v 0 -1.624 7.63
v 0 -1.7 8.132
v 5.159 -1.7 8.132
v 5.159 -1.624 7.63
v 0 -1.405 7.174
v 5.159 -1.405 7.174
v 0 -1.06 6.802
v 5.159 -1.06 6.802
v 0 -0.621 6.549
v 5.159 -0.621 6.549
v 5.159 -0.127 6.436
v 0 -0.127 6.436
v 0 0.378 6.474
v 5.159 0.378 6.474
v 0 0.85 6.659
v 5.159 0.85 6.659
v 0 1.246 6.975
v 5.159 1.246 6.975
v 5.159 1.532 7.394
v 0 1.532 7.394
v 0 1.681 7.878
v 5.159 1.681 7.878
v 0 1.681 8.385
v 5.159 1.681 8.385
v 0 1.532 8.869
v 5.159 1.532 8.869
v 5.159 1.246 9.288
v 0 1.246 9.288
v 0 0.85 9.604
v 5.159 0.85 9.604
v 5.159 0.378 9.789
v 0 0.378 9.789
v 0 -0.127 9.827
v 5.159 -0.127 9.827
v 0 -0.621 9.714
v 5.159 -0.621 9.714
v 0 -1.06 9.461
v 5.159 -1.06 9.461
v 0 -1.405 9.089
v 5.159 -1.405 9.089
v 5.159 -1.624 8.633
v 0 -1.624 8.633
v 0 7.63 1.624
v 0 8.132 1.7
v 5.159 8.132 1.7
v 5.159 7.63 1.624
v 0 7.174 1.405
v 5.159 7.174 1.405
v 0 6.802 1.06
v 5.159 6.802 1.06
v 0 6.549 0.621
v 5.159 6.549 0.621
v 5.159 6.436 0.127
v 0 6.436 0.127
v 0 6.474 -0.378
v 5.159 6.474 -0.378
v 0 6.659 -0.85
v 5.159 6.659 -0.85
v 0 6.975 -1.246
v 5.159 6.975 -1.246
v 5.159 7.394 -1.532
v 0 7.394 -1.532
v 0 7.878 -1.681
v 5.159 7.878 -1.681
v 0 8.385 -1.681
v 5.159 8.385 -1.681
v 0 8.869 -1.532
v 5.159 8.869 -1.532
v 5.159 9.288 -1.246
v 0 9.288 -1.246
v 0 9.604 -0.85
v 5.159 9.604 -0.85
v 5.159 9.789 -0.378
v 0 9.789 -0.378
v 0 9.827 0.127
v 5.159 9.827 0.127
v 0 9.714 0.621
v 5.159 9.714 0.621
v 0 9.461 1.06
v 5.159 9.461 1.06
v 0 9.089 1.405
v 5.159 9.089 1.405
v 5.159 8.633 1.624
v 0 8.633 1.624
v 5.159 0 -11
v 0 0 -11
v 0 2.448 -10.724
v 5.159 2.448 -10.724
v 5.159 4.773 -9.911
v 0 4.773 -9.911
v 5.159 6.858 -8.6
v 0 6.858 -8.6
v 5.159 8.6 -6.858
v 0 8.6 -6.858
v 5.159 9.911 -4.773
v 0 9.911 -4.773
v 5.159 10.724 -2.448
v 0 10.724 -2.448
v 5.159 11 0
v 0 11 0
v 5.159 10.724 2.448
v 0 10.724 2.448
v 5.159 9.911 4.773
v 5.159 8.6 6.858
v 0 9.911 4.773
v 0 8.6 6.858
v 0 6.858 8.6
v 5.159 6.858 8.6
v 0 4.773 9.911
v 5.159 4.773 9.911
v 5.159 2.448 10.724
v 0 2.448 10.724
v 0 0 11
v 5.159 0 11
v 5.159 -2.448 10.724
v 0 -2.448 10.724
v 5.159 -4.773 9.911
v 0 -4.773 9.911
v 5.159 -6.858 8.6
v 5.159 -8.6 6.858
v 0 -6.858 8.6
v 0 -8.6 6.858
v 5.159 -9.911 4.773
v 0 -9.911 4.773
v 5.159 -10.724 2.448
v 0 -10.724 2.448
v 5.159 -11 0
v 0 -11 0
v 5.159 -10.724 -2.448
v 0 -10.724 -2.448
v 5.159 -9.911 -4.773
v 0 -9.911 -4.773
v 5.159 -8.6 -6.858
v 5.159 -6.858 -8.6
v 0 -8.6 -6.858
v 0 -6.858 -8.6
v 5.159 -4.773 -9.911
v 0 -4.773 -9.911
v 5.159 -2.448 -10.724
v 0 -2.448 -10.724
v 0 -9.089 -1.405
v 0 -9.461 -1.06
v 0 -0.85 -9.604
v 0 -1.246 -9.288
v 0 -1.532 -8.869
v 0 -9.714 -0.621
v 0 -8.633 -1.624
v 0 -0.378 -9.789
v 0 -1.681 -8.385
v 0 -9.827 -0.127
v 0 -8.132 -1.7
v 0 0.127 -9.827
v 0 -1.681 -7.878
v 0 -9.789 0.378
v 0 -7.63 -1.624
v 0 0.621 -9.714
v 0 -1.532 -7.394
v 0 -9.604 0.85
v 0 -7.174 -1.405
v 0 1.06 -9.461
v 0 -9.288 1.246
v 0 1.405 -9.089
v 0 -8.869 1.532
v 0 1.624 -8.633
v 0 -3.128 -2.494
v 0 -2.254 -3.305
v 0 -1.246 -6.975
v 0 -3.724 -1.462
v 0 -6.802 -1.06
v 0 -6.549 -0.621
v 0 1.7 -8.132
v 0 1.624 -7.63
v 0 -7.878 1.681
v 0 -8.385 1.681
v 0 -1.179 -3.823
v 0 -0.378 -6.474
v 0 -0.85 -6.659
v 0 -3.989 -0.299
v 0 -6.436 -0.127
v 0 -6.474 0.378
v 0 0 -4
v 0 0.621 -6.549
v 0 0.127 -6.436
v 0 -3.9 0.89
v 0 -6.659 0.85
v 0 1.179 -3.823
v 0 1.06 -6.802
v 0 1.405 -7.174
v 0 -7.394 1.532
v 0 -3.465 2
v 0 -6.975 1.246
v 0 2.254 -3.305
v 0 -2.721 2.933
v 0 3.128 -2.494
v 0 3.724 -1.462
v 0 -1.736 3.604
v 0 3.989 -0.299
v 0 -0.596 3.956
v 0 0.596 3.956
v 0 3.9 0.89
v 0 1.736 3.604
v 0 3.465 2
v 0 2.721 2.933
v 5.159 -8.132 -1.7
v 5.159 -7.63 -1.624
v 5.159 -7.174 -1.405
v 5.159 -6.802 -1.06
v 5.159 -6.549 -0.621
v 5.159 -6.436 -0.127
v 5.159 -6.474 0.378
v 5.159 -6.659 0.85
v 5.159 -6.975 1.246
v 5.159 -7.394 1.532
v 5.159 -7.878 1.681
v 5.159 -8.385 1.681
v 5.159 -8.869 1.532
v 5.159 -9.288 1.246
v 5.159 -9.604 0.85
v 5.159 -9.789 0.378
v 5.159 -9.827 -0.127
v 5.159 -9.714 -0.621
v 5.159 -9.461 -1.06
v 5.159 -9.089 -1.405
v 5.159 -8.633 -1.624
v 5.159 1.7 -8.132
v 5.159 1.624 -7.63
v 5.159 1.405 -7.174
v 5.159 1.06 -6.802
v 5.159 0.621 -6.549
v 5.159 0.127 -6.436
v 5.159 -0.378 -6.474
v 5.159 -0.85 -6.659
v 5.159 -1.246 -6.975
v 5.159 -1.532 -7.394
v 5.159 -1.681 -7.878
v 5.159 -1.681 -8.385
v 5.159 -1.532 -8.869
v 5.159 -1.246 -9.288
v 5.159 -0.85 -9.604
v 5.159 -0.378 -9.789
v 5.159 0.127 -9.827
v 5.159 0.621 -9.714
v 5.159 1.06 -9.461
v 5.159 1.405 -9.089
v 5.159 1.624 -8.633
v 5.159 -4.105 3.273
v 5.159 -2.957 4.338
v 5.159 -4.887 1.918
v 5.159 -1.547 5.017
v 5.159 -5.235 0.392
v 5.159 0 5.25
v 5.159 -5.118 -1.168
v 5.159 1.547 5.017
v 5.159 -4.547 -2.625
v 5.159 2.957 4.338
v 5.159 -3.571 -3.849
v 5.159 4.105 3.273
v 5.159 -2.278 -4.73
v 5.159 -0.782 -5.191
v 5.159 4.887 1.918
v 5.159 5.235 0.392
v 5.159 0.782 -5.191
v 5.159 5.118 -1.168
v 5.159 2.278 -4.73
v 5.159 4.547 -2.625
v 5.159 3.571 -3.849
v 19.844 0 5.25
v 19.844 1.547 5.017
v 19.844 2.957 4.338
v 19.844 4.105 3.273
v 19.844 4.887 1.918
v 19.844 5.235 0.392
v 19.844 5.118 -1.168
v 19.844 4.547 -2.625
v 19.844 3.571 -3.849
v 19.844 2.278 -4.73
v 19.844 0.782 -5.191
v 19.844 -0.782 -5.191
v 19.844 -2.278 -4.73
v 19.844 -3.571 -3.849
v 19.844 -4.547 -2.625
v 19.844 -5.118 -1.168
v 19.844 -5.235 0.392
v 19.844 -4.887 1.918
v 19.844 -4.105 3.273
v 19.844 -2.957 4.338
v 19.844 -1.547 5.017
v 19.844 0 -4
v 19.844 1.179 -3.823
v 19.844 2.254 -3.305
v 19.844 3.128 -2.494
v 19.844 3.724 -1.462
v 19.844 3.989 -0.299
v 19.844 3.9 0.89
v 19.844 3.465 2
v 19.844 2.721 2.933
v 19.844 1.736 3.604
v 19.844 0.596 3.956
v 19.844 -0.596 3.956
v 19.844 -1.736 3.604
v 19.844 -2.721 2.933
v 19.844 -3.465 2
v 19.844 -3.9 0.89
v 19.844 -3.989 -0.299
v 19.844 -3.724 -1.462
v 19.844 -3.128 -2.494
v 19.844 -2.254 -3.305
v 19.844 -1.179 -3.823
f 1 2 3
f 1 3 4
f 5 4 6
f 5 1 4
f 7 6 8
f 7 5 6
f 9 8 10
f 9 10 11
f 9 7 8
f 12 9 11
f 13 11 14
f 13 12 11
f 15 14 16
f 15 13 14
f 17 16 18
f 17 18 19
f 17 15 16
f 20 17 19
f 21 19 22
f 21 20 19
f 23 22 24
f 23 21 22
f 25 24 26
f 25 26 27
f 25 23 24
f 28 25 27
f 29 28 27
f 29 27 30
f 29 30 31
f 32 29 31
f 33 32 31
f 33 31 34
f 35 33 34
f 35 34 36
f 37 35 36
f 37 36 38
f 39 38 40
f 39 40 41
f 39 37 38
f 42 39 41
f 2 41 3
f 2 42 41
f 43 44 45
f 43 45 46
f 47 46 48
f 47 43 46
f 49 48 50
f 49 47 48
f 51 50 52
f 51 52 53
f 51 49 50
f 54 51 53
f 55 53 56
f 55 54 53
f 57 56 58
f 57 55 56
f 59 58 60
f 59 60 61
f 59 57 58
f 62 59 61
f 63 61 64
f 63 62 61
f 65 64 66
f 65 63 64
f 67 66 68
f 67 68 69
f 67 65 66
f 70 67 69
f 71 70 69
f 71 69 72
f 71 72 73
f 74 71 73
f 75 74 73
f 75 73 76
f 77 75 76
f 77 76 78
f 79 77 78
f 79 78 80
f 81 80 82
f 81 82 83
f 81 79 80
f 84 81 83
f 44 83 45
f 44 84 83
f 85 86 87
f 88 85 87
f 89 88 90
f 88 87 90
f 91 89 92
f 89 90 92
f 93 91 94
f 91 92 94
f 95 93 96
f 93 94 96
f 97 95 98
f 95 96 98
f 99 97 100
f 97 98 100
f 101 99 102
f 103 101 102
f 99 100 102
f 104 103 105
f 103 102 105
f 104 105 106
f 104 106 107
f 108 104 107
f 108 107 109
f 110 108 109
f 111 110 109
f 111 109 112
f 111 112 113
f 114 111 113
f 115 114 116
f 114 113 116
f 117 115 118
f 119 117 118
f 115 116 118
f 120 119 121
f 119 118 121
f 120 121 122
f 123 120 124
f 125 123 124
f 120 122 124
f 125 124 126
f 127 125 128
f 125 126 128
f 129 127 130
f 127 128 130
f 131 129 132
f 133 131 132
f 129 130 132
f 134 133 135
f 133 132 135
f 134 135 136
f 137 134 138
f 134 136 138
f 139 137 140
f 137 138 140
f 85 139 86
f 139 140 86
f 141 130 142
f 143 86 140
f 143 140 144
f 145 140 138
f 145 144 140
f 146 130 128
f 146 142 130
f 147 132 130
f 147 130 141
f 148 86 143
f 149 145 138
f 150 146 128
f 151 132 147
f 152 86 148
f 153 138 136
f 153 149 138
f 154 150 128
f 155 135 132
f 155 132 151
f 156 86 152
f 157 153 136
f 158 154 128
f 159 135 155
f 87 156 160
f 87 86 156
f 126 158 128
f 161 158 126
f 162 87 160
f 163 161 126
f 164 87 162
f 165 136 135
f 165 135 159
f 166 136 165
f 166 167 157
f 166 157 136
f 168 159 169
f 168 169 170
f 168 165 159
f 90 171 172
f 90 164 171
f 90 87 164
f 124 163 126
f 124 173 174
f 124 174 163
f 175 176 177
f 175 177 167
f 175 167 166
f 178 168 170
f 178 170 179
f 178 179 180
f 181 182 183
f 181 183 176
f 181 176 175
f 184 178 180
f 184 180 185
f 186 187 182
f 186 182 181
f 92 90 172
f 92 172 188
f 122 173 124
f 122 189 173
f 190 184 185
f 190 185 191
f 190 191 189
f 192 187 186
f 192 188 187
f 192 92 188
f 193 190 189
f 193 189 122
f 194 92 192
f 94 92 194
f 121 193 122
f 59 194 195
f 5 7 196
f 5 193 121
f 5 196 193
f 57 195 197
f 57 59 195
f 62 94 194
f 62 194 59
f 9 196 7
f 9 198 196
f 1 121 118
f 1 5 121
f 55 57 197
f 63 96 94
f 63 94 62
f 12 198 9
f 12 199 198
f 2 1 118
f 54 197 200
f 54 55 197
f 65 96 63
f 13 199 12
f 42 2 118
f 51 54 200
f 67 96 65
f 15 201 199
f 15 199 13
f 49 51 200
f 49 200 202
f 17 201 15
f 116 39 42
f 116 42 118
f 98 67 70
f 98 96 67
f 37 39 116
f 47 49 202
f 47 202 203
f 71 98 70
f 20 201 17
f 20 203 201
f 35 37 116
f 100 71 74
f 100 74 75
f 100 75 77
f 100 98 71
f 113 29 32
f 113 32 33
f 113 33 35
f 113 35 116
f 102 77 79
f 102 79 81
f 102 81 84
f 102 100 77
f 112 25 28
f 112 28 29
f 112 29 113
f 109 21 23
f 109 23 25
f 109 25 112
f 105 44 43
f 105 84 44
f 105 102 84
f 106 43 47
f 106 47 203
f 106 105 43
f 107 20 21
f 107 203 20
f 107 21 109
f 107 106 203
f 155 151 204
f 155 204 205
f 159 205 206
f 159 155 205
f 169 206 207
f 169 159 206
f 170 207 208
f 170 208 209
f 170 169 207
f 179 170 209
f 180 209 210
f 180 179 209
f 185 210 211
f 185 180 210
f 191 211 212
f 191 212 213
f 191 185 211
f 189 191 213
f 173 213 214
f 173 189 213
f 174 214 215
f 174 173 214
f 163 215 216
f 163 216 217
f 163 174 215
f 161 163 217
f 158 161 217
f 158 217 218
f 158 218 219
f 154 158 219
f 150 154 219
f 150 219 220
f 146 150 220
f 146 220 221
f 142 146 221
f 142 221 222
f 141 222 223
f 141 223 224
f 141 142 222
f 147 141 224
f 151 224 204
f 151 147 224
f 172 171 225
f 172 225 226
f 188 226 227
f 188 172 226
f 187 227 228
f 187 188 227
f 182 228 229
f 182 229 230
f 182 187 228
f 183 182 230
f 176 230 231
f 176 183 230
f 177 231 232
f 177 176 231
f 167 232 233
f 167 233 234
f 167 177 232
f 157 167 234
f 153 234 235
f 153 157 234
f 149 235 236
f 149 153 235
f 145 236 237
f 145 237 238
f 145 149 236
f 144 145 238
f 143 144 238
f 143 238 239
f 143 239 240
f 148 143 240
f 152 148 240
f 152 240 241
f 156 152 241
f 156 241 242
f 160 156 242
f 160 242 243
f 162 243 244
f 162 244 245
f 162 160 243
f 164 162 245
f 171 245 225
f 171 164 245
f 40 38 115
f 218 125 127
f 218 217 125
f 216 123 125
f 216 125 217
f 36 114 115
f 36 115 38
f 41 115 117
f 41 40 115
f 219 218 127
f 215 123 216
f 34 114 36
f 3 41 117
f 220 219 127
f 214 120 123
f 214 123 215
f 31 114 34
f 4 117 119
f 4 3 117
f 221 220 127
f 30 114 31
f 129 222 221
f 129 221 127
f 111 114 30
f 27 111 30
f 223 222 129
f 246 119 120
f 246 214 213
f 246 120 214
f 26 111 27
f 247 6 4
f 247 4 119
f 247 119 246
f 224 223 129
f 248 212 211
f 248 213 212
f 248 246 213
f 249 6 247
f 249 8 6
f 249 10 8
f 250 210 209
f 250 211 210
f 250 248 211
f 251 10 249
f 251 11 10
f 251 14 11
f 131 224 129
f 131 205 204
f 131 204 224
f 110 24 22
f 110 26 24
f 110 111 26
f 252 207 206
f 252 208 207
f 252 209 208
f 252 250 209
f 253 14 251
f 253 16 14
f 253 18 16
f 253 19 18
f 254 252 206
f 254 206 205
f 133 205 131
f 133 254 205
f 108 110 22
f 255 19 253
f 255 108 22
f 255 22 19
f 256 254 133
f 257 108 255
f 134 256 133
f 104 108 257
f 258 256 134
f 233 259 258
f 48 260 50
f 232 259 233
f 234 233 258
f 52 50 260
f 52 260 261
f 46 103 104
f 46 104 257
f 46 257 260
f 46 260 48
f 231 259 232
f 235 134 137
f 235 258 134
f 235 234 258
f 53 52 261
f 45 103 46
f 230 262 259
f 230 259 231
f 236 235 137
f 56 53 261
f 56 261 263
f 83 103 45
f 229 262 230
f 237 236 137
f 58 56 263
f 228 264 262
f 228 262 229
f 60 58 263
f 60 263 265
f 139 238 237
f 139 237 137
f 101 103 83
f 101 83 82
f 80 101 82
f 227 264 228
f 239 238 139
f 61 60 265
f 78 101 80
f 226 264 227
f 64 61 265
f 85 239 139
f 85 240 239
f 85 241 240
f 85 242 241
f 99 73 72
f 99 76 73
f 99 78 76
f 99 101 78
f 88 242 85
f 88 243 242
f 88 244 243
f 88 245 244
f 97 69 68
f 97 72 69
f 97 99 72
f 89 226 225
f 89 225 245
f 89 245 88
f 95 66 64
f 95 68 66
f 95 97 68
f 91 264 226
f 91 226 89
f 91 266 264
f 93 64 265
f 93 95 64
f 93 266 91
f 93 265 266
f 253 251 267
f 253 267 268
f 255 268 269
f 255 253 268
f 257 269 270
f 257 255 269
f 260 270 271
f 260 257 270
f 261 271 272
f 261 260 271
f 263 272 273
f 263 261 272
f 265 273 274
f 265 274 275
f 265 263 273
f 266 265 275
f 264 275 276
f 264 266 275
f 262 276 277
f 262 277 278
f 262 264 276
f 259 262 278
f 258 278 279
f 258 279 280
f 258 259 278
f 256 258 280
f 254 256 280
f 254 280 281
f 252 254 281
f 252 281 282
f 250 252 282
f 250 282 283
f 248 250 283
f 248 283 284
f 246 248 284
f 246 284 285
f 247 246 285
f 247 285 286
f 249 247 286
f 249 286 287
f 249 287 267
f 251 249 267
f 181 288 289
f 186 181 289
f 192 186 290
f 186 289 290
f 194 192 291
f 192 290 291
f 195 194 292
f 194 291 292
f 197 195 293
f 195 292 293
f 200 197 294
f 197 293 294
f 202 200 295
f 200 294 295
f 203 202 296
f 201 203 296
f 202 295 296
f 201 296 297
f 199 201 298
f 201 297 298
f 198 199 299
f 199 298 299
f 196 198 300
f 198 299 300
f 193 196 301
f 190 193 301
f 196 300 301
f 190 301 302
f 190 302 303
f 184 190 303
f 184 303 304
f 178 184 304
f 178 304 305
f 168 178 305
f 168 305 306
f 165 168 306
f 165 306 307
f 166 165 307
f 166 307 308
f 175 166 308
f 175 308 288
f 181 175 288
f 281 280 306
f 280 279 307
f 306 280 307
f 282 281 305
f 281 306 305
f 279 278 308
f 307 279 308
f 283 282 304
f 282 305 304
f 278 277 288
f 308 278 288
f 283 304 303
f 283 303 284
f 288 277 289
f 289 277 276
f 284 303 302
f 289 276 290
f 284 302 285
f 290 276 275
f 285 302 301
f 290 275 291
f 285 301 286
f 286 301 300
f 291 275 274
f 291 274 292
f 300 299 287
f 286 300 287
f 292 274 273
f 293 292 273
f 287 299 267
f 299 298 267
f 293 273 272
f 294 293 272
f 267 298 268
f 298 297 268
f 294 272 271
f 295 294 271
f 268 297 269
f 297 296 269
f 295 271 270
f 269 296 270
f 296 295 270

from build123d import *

# Parameters (mm, degrees)
SKETCH4_R           = 11
BOSS_EXTRUDE2_DEPTH = 5.159375
SKETCH5_R           = 5.25
BOSS_EXTRUDE3_DEPTH = 19.84375
SKETCH6_R           = 1.7
CUT_EXTRUDE1_DEPTH  = 5.159375
CIRPATTERN2_COUNT   = 4
SKETCH8_R           = 4.0005
CUT_EXTRUDE3_DEPTH  = 26.214567497


with BuildPart() as part:
    # Sketch4 → Boss-Extrude2 (new body)
    with BuildSketch(Plane(origin=(0, 0, 0), x_dir=(0, 0, -1), z_dir=(1, 0, 0))):
        Circle(SKETCH4_R)
    extrude(amount=BOSS_EXTRUDE2_DEPTH)

    # Sketch5 → Boss-Extrude3 (add)
    with BuildSketch(Plane.ZY):
        Circle(SKETCH5_R)
    extrude(amount=-BOSS_EXTRUDE3_DEPTH)

    # Sketch6 → Cut-Extrude1 (cut)
    with BuildSketch(Plane(origin=(0, 0, 0), x_dir=(0, 0, -1), z_dir=(1, 0, 0))):
        with Locations(Location((0, 8.1315, 0), (0, 0, 180))):
            Circle(SKETCH6_R)
    cut_extrude1 = extrude(amount=CUT_EXTRUDE1_DEPTH, mode=Mode.SUBTRACT)

    # CirPattern2: Cut-Extrude1 ×4 about axis
    cirpattern2_axis = Axis((0, 0, 0), (1, 0, 0))
    for i in range(1, CIRPATTERN2_COUNT):
        add(cut_extrude1.rotate(cirpattern2_axis, i * 360 / CIRPATTERN2_COUNT), mode=Mode.SUBTRACT)

    # Sketch8 → Cut-Extrude3 (cut, through all)
    with BuildSketch(Plane(origin=(19.84375, 0, 0), x_dir=(0, 0, -1), z_dir=(1, 0, 0))):
        Circle(SKETCH8_R)
    extrude(amount=-CUT_EXTRUDE3_DEPTH, mode=Mode.SUBTRACT)


solid = part.part
